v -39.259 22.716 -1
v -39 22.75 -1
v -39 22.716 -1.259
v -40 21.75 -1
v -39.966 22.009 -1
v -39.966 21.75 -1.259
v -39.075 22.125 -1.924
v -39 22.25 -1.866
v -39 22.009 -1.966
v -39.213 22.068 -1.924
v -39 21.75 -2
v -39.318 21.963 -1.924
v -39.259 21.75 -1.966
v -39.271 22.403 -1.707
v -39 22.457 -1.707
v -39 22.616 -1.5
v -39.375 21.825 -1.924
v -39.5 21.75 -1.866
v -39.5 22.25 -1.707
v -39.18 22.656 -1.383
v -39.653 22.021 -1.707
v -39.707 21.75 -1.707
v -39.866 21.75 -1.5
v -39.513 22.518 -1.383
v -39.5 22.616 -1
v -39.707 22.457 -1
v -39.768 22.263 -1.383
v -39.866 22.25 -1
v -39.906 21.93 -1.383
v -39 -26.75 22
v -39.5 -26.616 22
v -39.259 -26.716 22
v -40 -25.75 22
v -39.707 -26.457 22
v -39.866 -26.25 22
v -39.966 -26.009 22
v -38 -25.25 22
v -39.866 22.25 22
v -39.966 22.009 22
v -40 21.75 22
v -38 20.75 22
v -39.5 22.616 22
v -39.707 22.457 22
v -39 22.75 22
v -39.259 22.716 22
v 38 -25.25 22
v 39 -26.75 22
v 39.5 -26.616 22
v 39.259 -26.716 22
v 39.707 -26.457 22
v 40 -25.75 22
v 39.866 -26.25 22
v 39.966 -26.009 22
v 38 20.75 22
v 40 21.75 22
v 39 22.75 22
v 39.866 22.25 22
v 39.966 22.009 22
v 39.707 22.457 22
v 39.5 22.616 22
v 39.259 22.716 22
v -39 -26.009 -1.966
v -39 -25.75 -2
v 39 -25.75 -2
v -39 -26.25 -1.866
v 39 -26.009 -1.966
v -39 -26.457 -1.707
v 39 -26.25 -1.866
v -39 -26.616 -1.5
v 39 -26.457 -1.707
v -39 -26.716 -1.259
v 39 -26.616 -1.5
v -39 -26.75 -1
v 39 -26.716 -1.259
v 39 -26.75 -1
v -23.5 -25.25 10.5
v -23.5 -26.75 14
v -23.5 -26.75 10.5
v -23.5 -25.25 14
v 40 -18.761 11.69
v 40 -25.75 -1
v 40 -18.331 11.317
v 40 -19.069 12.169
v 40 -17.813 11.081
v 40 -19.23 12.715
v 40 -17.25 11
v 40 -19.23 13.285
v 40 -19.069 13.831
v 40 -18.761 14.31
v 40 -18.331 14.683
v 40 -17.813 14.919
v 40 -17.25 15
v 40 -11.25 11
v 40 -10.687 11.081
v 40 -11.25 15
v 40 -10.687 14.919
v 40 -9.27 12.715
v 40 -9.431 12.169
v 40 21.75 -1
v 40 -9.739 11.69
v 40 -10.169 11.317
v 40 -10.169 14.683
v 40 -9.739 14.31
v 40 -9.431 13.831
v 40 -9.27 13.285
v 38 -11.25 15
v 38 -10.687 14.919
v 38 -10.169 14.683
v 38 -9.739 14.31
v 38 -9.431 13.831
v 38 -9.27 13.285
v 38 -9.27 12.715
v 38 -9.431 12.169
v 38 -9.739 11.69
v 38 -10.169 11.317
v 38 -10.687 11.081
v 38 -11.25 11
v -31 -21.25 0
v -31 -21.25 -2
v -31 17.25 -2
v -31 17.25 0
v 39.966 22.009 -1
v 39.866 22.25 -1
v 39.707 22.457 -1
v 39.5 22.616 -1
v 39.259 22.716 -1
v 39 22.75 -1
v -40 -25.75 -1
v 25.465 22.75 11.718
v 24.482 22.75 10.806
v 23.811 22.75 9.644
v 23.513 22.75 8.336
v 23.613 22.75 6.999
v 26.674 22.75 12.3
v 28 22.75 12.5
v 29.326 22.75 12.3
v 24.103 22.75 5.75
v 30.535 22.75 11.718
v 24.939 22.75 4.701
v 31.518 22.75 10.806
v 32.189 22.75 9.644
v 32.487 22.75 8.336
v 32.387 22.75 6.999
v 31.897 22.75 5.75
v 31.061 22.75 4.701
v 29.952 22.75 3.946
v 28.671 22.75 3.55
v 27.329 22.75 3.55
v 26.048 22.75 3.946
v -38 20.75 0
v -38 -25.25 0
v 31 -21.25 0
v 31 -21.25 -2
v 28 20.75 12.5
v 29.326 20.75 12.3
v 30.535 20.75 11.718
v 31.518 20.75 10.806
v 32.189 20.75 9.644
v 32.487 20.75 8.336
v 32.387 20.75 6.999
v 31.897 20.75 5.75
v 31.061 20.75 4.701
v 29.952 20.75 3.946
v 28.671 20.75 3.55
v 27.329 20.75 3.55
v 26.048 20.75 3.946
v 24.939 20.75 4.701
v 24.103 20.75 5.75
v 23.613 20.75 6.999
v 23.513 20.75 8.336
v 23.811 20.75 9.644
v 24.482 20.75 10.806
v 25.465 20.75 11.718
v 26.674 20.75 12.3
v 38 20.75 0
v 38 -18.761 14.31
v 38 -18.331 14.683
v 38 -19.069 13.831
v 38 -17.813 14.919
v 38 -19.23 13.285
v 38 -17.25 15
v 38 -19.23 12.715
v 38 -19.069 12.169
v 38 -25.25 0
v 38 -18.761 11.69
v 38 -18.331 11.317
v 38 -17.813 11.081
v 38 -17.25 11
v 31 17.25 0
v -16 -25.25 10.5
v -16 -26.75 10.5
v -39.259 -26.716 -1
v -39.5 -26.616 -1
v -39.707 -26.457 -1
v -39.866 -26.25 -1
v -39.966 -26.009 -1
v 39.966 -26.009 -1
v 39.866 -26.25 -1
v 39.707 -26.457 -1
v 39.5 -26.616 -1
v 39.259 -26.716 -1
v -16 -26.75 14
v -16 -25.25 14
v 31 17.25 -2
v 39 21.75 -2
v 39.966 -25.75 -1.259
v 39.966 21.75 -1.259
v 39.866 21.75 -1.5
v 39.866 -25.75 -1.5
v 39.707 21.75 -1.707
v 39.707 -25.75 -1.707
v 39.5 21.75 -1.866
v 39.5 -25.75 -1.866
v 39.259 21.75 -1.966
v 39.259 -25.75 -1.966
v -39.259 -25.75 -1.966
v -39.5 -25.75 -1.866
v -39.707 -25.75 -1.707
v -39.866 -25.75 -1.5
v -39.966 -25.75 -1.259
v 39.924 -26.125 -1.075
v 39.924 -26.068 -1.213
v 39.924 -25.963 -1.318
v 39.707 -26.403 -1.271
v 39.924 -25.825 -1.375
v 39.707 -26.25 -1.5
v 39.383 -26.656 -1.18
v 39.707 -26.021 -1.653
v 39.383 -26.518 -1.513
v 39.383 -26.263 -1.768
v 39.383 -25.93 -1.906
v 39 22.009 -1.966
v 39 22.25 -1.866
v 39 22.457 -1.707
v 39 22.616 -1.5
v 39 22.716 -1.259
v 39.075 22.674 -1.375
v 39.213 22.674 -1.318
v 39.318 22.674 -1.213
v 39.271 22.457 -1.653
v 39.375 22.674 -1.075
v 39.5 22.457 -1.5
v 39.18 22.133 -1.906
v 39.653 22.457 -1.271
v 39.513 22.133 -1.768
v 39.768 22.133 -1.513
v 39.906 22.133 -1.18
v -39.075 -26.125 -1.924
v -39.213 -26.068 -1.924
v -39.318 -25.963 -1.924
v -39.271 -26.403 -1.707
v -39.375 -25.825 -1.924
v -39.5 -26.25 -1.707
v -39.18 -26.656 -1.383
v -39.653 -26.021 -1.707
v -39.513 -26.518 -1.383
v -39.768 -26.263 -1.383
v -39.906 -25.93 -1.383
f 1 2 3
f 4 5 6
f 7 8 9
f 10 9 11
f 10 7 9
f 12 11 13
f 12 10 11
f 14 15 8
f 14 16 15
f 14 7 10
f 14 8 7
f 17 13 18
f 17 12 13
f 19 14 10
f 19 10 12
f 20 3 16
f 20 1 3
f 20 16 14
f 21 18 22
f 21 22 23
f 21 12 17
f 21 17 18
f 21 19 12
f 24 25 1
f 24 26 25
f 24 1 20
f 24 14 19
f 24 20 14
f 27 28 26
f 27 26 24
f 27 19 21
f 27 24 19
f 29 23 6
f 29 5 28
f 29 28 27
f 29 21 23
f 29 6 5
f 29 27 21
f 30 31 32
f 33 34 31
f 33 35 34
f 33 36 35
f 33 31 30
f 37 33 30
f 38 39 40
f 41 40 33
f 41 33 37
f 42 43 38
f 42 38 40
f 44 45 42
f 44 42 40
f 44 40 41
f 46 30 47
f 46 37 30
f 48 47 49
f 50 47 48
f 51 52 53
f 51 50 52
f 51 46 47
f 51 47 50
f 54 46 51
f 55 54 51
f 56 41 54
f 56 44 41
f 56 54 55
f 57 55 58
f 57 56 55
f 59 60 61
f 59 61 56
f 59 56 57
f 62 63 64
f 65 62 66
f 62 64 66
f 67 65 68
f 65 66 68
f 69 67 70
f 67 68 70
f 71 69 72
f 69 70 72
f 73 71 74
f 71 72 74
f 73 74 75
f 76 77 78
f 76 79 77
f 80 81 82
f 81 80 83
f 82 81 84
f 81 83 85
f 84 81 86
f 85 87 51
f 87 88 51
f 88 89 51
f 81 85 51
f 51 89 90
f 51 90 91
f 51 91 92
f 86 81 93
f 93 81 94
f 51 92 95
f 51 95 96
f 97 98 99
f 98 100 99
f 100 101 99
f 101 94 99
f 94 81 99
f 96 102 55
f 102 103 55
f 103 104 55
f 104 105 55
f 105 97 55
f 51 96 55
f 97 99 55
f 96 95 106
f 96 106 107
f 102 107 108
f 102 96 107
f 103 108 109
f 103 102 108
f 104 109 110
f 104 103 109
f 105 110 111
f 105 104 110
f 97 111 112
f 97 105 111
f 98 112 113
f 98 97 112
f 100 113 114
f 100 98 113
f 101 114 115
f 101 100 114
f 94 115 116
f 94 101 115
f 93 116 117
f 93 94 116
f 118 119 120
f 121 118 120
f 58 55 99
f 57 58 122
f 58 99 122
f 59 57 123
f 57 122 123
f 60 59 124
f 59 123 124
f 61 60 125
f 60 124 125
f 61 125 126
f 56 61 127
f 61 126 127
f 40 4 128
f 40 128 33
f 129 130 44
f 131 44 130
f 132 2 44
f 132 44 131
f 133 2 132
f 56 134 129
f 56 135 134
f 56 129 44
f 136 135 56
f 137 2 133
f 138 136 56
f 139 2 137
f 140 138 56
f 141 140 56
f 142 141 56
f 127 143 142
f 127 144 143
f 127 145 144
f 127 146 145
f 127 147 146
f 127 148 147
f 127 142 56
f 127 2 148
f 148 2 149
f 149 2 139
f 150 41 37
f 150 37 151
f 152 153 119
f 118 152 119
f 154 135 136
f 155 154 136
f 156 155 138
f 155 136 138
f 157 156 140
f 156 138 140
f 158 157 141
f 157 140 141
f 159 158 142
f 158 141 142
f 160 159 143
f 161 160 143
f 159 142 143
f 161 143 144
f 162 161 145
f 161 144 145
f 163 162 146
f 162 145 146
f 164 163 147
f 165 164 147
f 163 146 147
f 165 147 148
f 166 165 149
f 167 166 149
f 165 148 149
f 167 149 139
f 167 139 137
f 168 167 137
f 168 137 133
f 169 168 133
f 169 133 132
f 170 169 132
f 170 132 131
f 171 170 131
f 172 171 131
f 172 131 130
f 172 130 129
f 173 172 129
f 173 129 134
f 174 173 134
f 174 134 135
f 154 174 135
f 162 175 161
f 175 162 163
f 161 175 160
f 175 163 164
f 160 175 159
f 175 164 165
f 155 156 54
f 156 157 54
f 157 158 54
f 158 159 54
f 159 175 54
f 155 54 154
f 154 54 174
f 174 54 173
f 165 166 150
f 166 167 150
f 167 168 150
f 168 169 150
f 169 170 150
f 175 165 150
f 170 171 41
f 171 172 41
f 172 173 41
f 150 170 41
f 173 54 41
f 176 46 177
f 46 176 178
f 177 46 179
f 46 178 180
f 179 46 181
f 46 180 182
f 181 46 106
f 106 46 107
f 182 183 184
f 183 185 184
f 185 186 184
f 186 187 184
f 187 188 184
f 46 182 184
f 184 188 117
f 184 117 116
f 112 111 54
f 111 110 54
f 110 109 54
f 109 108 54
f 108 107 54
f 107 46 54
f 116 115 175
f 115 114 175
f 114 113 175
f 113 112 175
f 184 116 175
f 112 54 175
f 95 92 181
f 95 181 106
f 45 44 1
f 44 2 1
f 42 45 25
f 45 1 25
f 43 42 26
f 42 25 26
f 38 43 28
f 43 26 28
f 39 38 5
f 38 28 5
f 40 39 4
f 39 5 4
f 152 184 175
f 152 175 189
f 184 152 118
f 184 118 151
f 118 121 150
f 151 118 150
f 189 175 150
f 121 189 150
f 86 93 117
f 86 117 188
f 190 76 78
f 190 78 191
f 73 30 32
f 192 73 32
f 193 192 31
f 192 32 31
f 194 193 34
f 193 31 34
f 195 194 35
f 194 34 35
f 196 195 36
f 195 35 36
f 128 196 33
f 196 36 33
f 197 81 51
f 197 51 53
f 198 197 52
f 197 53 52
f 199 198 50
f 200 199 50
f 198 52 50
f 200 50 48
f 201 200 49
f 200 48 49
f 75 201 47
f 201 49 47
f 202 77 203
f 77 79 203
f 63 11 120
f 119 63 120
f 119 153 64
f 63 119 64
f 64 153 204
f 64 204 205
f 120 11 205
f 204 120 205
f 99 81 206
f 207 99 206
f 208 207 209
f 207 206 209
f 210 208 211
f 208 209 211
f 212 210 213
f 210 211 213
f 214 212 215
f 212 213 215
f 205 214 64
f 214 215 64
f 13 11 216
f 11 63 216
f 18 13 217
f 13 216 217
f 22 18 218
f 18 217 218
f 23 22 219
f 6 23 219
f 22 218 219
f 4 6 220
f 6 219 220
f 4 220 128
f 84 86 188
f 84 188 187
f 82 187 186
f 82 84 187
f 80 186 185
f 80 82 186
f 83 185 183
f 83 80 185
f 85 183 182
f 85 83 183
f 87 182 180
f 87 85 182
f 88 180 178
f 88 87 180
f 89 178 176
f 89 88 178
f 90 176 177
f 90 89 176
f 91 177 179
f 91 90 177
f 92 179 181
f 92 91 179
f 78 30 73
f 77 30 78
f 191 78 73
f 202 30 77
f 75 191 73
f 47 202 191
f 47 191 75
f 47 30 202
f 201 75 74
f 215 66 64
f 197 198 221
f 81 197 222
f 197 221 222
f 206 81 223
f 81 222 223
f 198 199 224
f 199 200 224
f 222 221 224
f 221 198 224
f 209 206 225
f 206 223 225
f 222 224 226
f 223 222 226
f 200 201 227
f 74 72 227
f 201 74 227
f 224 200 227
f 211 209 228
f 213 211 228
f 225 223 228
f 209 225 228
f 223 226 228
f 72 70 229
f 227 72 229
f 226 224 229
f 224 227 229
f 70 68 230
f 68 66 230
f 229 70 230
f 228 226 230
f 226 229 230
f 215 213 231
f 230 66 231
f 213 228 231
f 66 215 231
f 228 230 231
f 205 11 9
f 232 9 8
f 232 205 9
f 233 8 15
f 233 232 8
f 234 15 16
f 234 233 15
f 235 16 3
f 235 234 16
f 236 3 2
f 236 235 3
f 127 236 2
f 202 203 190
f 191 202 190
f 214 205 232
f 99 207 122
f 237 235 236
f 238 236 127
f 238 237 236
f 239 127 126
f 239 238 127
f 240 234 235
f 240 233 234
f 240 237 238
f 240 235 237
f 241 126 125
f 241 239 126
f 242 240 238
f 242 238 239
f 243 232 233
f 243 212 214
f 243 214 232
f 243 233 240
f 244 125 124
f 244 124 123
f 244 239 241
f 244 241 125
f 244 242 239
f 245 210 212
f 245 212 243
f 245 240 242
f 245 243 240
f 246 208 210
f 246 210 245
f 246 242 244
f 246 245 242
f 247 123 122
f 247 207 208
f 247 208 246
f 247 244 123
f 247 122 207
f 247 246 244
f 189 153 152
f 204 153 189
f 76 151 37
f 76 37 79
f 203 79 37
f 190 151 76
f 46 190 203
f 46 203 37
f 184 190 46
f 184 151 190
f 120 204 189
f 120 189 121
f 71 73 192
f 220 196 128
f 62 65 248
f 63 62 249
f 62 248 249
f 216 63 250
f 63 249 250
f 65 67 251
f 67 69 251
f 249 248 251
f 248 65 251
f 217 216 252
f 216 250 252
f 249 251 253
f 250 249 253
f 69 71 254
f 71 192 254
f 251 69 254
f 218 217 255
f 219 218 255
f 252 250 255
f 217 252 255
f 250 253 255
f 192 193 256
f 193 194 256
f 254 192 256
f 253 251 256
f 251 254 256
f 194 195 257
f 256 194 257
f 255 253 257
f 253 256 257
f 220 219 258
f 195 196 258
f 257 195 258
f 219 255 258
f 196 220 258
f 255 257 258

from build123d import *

# Parameters (mm, degrees)
SKETCH_1_W           = 80
SKETCH_1_H           = 51.5
SKETCH_1_W_2         = 76
SKETCH_1_H_2         = 50.5
EXTRUDE_1_DEPTH      = 22
SKETCH_2_W           = 80
SKETCH_2_H           = 51.5
EXTRUDE_2_DEPTH      = 2
CUT_EXTRUDE_1_REACH  = 88.874
CUT_EXTRUDE_2_REACH  = 70.82
SKETCH_6_W           = 7.5
SKETCH_6_H           = 3.5
CUT_EXTRUDE_3_REACH  = 70.82
SKETCH_7_W           = 76
SKETCH_7_H           = 20
SKETCH_8_W           = 80
SKETCH_8_H           = 51.5
EXTRUDE_3_DEPTH      = 2
SKETCH_9_W           = 62
SKETCH_9_H           = 36
CUT_EXTRUDE_4_DEPTH  = 2
SKETCH_15_W          = 80
SKETCH_15_H          = 24
EXTRUDE_5_DEPTH      = 1
SKETCH_16_W          = 7.5
SKETCH_16_H          = 3.5
CUT_EXTRUDE_6_DEPTH  = 1
SKETCH_17_W          = 62
SKETCH_17_H          = 2
CUT_EXTRUDE_7_DEPTH  = 2
SKETCH_19_W          = 80
SKETCH_19_H          = 24
CUT_EXTRUDE_8_DEPTH  = 3
SKETCH_20_W          = 76
SKETCH_20_H          = 2
EXTRUDE_6_DEPTH      = 20
SKETCH_21_W          = 76
SKETCH_21_H          = 46
CUT_EXTRUDE_9_DEPTH  = 10
FILLET_1_R           = 1
SKETCH_22_R          = 4.5
CUT_EXTRUDE_10_DEPTH = 10
SKETCH_23_W          = 62
SKETCH_23_H          = 0.5
CUT_EXTRUDE_11_DEPTH = 10


with BuildPart() as part:
    # 草图1 → 凸台-拉伸1 (new body)
    with BuildSketch(Plane.XY):
        Rectangle(SKETCH_1_W, SKETCH_1_H)
        Rectangle(SKETCH_1_W_2, SKETCH_1_H_2, mode=Mode.SUBTRACT)
    extrude(amount=EXTRUDE_1_DEPTH)

    # 草图2 → 凸台-拉伸2 (add)
    with BuildSketch(Plane.XY.offset(22)):
        Rectangle(SKETCH_2_W, SKETCH_2_H)
    extrude(amount=-EXTRUDE_2_DEPTH)

    # 草图4 → 切除-拉伸1 (cut, up to next)
    with BuildSketch(Plane(origin=(40, 0, 0), x_dir=(0, 0, -1), z_dir=(1, 0, 0)), mode=Mode.PRIVATE) as cut_extrude_1_sk1:
        with BuildLine():
            Line((-11, -11.25), (-11, -17.25))
            ThreePointArc((-11, -17.25), (-13, -19.25), (-15, -17.25))
            Line((-15, -17.25), (-15, -11.25))
            ThreePointArc((-15, -11.25), (-13, -9.25), (-11, -11.25))
        make_face()
    cut_extrude_1_tool1 = extrude(cut_extrude_1_sk1.sketch, amount=-CUT_EXTRUDE_1_REACH, mode=Mode.PRIVATE) & part.part
    add(cut_extrude_1_tool1.solids().sort_by_distance((40, -14.25, 13))[0], mode=Mode.SUBTRACT)

    # 草图6 → 切除-拉伸2 (cut, up to next)
    with BuildSketch(Plane.XZ.offset(25.75), mode=Mode.PRIVATE) as cut_extrude_2_sk1:
        with Locations((-19.75, 12.25)):
            Rectangle(SKETCH_6_W, SKETCH_6_H)
    cut_extrude_2_tool1 = extrude(cut_extrude_2_sk1.sketch, amount=-CUT_EXTRUDE_2_REACH, mode=Mode.PRIVATE) & part.part
    add(cut_extrude_2_tool1.solids().sort_by_distance((-19.75, -25.75, 12.25))[0], mode=Mode.SUBTRACT)

    # 草图7 → 切除-拉伸3 (cut, up to next)
    with BuildSketch(Plane(origin=(0, 25.75, 0), x_dir=(1, 0, 0), z_dir=(0, 1, 0)), mode=Mode.PRIVATE) as cut_extrude_3_sk1:
        with Locations((0, -10)):
            Rectangle(SKETCH_7_W, SKETCH_7_H)
    cut_extrude_3_tool1 = extrude(cut_extrude_3_sk1.sketch, amount=-CUT_EXTRUDE_3_REACH, mode=Mode.PRIVATE) & part.part
    add(cut_extrude_3_tool1.solids().sort_by_distance((0, 25.75, 10))[0], mode=Mode.SUBTRACT)

    # 草图8 → 凸台-拉伸3 (add)
    with BuildSketch(Plane(origin=(0, 0, 0), x_dir=(-1, 0, 0), z_dir=(0, 0, -1))):
        Rectangle(SKETCH_8_W, SKETCH_8_H)
    extrude(amount=EXTRUDE_3_DEPTH)

    # 草图9 → 切除-拉伸4 (cut)
    with BuildSketch(Plane(origin=(0, 0, -2), x_dir=(-1, 0, 0), z_dir=(0, 0, -1))):
        with Locations((0, -1.25)):
            Rectangle(SKETCH_9_W, SKETCH_9_H)
    extrude(amount=-CUT_EXTRUDE_4_DEPTH, mode=Mode.SUBTRACT)

    # 草图15 → 凸台-拉伸5 (add)
    with BuildSketch(Plane.XZ.offset(25.75)):
        with Locations((0, 10)):
            Rectangle(SKETCH_15_W, SKETCH_15_H)
    extrude(amount=EXTRUDE_5_DEPTH)

    # 草图16 → 切除-拉伸6 (cut)
    with BuildSketch(Plane(origin=(0, -25.75, 0), x_dir=(1, 0, 0), z_dir=(0, 1, 0))):
        with Locations((-19.75, -12.25)):
            Rectangle(SKETCH_16_W, SKETCH_16_H)
    extrude(amount=-CUT_EXTRUDE_6_DEPTH, mode=Mode.SUBTRACT)

    # 草图17 → 切除-拉伸7 (cut)
    with BuildSketch(Plane(origin=(0, 0, -2), x_dir=(-1, 0, 0), z_dir=(0, 0, -1))):
        with Locations((0, -20.25)):
            Rectangle(SKETCH_17_W, SKETCH_17_H)
    extrude(amount=-CUT_EXTRUDE_7_DEPTH, mode=Mode.SUBTRACT)

    # 草图19 → 切除-拉伸8 (cut)
    with BuildSketch(Plane(origin=(0, 25.75, 0), x_dir=(1, 0, 0), z_dir=(0, 1, 0))):
        with Locations((0, -10)):
            Rectangle(SKETCH_19_W, SKETCH_19_H)
    extrude(amount=-CUT_EXTRUDE_8_DEPTH, mode=Mode.SUBTRACT)

    # 草图20 → 凸台-拉伸6 (add)
    with BuildSketch(Plane(origin=(0, 0, 20), x_dir=(-1, 0, 0), z_dir=(0, 0, -1))):
        with Locations((0, 21.75)):
            Rectangle(SKETCH_20_W, SKETCH_20_H)
    extrude(amount=EXTRUDE_6_DEPTH)

    # 草图21 → 切除-拉伸9 (cut)
    with BuildSketch(Plane(origin=(0, 0, 20), x_dir=(-1, 0, 0), z_dir=(0, 0, -1))):
        with Locations((0, -2.25)):
            Rectangle(SKETCH_21_W, SKETCH_21_H)
    extrude(amount=-CUT_EXTRUDE_9_DEPTH, mode=Mode.SUBTRACT)

    # 圆角1
    fillet_1_edges = [part.edges().sort_by_distance(p)[0] for p in [
        (-40, -26.75, 10),
        (0, -26.75, -2),
        (40, -26.75, 10),
        (40, -2, -2),
        (-40, 22.75, 10),
        (0, 22.75, -2),
        (40, 22.75, 10),
        (-40, -2, -2),
    ]]
    fillet(fillet_1_edges, radius=FILLET_1_R)

    # 草图22 → 切除-拉伸10 (cut)
    with BuildSketch(Plane(origin=(0, 22.75, 0), x_dir=(1, 0, 0), z_dir=(0, 1, 0))):
        with Locations(Location((28, -8, 0), (0, 0, 270))):
            Circle(SKETCH_22_R)
    extrude(amount=-CUT_EXTRUDE_10_DEPTH, mode=Mode.SUBTRACT)

    # 草图23 → 切除-拉伸11 (cut)
    with BuildSketch(Plane(origin=(0, 0, -2), x_dir=(-1, 0, 0), z_dir=(0, 0, -1))):
        with Locations((0, 17)):
            Rectangle(SKETCH_23_W, SKETCH_23_H)
    extrude(amount=-CUT_EXTRUDE_11_DEPTH, mode=Mode.SUBTRACT)


solid = part.part
